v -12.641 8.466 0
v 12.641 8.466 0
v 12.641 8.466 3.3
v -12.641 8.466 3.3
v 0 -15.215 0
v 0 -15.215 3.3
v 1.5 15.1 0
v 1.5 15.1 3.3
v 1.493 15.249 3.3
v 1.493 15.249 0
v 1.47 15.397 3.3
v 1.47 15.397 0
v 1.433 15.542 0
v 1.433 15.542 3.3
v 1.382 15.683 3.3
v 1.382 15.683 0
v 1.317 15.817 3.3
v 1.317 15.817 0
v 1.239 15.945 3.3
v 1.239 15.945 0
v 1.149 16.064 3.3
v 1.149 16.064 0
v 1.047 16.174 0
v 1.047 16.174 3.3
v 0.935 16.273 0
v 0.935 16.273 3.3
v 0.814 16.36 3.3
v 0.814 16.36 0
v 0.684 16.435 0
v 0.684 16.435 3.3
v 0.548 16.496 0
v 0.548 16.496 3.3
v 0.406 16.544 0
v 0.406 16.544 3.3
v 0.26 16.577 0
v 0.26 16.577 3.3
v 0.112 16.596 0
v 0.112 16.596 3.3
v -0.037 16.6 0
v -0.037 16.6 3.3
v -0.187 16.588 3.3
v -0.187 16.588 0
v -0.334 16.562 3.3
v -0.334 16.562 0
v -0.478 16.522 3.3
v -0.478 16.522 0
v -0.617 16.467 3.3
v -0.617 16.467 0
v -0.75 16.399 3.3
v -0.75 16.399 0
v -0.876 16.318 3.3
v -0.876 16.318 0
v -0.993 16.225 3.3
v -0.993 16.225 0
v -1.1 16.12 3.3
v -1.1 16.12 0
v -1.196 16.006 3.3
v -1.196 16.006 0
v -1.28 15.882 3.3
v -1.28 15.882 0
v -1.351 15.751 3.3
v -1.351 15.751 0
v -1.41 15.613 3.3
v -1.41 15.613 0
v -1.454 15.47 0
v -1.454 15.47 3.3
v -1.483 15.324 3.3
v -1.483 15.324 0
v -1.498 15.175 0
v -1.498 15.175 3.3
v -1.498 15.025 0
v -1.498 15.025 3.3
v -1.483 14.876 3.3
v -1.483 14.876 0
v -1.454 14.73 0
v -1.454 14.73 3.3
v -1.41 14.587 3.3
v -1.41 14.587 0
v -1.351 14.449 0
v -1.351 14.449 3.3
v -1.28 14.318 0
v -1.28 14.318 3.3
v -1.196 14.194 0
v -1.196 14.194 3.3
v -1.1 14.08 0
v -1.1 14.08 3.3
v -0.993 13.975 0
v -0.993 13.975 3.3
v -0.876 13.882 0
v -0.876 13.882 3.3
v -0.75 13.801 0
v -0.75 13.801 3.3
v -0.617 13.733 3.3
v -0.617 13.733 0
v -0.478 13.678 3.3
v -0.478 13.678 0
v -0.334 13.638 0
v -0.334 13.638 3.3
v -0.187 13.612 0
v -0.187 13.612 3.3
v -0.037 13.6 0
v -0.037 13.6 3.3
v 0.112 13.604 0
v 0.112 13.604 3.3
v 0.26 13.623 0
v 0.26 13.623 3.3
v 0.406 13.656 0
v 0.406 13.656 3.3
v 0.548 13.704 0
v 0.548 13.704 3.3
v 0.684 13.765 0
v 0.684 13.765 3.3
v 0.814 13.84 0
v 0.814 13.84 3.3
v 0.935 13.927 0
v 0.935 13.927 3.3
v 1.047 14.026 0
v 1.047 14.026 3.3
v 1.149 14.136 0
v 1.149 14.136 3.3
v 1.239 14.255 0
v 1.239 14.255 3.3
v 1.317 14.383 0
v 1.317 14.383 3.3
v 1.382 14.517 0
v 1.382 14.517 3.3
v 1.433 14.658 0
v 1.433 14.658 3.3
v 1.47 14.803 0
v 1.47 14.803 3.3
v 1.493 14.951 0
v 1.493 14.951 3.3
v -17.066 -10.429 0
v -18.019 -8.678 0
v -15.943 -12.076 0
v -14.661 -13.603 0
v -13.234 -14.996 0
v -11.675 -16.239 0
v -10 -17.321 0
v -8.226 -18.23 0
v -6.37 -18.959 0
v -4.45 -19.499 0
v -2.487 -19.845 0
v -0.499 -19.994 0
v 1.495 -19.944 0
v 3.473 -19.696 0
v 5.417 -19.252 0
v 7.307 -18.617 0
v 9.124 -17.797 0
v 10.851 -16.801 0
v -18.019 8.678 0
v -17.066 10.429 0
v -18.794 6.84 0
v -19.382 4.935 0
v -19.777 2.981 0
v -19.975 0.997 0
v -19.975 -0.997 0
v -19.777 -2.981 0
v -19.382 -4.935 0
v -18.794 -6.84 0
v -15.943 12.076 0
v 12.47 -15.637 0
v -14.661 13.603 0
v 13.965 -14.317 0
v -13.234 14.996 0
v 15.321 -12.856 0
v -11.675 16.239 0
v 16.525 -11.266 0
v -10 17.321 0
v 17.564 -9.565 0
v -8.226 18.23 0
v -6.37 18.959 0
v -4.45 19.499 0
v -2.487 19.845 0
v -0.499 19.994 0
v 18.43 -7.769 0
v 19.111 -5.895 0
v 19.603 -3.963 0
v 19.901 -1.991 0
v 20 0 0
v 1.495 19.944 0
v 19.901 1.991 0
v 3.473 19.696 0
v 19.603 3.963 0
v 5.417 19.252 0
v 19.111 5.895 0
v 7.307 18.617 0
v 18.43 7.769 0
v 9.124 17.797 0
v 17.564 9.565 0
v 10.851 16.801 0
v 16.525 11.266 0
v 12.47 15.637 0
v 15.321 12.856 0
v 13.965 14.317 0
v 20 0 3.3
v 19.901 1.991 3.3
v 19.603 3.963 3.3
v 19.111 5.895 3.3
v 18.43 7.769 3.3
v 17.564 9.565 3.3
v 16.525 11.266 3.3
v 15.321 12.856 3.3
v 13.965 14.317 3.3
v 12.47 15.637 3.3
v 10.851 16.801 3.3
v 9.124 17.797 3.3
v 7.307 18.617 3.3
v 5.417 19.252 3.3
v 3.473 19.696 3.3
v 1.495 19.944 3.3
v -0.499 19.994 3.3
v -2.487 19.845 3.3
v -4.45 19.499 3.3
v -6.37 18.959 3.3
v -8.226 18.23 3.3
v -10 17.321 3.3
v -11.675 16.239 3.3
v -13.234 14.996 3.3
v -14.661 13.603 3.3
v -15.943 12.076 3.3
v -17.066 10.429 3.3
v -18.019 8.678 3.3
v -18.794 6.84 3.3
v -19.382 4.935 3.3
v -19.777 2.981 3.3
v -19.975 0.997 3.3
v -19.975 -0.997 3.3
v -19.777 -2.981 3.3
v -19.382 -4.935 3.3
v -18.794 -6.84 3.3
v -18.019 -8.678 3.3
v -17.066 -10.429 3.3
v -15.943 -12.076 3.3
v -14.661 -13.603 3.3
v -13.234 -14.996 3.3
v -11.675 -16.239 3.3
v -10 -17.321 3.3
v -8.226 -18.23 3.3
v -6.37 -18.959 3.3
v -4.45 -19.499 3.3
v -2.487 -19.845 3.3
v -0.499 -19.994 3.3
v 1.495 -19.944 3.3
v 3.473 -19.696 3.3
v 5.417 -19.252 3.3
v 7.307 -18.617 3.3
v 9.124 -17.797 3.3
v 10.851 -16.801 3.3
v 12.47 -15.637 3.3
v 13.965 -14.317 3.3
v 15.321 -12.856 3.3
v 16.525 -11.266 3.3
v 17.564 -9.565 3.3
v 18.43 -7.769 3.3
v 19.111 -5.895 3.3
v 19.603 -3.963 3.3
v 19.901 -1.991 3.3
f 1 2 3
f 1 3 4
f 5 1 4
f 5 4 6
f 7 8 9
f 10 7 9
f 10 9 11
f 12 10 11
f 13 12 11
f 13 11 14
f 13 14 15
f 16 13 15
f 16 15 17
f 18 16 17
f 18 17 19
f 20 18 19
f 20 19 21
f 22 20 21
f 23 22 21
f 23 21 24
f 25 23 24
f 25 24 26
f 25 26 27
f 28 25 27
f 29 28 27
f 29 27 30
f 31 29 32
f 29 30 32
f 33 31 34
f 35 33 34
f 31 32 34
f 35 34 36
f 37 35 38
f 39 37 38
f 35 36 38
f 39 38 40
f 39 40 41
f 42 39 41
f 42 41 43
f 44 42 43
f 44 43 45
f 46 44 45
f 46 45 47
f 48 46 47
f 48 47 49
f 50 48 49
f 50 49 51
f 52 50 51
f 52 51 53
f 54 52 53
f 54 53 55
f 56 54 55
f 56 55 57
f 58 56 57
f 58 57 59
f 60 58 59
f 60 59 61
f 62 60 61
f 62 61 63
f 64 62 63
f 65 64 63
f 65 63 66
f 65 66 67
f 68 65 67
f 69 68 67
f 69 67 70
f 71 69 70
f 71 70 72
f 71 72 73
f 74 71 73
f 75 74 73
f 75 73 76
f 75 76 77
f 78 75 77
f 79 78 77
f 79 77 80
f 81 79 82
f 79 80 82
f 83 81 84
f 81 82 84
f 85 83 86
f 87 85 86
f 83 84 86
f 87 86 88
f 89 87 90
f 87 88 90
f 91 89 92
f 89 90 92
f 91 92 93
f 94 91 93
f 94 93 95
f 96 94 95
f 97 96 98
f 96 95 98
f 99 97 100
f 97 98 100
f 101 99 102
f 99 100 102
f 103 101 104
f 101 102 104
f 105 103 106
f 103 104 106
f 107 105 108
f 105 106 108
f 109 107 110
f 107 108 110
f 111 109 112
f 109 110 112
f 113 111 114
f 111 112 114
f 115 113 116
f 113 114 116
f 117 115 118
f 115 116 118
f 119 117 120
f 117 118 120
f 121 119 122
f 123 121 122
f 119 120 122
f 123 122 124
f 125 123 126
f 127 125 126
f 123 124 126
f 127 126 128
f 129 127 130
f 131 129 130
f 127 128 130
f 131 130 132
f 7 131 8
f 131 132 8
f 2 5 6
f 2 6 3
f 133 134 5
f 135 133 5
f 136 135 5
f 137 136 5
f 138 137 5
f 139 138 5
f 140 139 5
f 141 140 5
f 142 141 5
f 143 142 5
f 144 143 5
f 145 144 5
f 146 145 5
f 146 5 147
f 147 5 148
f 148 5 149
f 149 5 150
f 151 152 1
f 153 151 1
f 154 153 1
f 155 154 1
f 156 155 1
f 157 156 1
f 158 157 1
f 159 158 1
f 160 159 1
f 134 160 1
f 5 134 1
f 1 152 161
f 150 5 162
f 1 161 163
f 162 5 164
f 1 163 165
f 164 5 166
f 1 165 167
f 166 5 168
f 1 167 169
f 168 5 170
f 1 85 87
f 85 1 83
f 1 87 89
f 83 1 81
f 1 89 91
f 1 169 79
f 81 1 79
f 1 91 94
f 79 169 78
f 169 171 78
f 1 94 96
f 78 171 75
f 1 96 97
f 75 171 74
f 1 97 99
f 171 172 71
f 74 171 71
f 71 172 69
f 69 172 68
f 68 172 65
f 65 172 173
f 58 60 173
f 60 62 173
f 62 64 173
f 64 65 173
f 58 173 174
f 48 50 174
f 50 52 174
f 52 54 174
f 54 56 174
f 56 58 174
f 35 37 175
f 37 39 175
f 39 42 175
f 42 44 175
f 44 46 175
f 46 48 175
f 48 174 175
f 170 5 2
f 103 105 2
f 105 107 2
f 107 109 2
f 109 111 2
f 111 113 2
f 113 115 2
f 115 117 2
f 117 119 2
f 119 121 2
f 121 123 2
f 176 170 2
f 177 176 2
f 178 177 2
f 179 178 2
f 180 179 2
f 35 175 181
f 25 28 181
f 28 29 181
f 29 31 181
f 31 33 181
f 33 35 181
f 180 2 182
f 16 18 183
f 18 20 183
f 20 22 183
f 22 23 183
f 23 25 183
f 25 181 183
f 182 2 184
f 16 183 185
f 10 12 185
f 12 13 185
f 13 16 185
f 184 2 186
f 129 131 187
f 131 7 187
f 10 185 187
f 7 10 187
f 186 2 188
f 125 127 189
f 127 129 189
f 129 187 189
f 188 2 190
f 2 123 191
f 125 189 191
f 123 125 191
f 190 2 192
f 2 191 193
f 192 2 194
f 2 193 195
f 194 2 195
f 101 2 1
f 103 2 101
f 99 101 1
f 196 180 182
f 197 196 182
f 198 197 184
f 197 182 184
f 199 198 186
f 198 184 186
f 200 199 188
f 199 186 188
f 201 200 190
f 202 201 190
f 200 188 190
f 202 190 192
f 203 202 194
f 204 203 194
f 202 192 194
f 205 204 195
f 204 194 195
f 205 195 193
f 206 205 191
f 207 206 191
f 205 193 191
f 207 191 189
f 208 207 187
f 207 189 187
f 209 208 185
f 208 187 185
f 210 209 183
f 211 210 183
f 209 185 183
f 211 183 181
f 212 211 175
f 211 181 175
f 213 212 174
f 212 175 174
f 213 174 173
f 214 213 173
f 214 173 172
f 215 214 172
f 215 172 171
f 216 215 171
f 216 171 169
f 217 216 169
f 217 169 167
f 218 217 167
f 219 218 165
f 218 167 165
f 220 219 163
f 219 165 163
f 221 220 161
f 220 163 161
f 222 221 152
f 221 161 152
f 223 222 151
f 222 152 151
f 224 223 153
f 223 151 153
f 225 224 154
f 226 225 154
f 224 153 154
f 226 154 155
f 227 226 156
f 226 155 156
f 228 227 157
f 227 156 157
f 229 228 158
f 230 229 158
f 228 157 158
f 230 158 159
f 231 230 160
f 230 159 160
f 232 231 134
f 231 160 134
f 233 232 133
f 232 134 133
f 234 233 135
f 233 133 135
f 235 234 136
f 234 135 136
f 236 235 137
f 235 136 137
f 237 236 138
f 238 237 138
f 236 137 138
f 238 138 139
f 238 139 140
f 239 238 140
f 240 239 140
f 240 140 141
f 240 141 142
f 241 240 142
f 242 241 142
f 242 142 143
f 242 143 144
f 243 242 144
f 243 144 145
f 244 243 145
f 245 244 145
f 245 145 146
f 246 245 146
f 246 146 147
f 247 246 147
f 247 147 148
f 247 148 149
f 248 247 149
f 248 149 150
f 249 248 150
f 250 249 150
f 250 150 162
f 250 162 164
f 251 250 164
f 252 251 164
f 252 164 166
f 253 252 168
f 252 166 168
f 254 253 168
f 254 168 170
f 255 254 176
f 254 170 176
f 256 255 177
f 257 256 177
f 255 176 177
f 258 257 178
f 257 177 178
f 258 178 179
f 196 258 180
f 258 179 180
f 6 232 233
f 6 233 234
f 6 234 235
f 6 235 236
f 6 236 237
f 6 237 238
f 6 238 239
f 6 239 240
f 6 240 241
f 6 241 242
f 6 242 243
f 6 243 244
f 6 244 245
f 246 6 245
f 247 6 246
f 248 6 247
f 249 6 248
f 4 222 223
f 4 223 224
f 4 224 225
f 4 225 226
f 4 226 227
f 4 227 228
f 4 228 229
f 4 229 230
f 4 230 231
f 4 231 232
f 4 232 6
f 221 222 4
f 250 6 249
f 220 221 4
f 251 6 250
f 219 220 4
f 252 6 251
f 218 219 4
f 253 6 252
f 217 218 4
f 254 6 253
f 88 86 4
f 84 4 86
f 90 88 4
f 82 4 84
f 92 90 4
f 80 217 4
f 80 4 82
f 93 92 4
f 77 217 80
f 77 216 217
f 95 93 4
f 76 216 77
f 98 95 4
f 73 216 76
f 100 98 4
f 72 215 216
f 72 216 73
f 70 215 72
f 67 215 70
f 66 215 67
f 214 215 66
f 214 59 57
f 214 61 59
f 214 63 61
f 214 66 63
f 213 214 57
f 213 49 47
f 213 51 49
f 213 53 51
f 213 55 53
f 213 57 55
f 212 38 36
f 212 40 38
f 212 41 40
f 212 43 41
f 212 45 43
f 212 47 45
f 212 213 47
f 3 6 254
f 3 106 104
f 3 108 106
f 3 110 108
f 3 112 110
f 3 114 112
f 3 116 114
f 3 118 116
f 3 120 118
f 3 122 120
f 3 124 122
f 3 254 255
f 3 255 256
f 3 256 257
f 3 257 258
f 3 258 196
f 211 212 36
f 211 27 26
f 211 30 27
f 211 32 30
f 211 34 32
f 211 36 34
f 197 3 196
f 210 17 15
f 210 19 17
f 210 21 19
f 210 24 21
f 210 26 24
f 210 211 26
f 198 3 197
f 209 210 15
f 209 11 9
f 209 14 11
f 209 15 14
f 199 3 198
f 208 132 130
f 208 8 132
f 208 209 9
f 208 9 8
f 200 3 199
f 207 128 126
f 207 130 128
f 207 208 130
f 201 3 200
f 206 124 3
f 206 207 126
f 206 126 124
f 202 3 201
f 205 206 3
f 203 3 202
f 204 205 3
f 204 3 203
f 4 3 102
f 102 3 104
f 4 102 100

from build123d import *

# Parameters (mm, degrees)
CYLINDER_R      = 20
CYLINDER_DEPTH  = 3.3
SKETCH_R        = 1.5
POCKET_DEPTH    = 3.301
POCKET001_DEPTH = 3.301


with BuildPart() as part:
    # Cylinder → Cylinder (new body)
    with BuildSketch(Plane.XY):
        Circle(CYLINDER_R)
    extrude(amount=CYLINDER_DEPTH)

    # Sketch → Pocket (cut, through all)
    with BuildSketch(Plane.XY.offset(3.3)):
        with Locations((0, 15.1)):
            Circle(SKETCH_R)
    extrude(amount=-POCKET_DEPTH, mode=Mode.SUBTRACT)

    # Sketch001 → Pocket001 (cut, through all)
    with BuildSketch(Plane(origin=(0, 0, 0), x_dir=(1, 0, 0), z_dir=(0, 0, -1))):
        Polygon((12.641277, -8.466407), (-12.641277, -8.466407), (0.000337, 15.21453), align=None)
    extrude(amount=-POCKET001_DEPTH, mode=Mode.SUBTRACT)


solid = part.part
